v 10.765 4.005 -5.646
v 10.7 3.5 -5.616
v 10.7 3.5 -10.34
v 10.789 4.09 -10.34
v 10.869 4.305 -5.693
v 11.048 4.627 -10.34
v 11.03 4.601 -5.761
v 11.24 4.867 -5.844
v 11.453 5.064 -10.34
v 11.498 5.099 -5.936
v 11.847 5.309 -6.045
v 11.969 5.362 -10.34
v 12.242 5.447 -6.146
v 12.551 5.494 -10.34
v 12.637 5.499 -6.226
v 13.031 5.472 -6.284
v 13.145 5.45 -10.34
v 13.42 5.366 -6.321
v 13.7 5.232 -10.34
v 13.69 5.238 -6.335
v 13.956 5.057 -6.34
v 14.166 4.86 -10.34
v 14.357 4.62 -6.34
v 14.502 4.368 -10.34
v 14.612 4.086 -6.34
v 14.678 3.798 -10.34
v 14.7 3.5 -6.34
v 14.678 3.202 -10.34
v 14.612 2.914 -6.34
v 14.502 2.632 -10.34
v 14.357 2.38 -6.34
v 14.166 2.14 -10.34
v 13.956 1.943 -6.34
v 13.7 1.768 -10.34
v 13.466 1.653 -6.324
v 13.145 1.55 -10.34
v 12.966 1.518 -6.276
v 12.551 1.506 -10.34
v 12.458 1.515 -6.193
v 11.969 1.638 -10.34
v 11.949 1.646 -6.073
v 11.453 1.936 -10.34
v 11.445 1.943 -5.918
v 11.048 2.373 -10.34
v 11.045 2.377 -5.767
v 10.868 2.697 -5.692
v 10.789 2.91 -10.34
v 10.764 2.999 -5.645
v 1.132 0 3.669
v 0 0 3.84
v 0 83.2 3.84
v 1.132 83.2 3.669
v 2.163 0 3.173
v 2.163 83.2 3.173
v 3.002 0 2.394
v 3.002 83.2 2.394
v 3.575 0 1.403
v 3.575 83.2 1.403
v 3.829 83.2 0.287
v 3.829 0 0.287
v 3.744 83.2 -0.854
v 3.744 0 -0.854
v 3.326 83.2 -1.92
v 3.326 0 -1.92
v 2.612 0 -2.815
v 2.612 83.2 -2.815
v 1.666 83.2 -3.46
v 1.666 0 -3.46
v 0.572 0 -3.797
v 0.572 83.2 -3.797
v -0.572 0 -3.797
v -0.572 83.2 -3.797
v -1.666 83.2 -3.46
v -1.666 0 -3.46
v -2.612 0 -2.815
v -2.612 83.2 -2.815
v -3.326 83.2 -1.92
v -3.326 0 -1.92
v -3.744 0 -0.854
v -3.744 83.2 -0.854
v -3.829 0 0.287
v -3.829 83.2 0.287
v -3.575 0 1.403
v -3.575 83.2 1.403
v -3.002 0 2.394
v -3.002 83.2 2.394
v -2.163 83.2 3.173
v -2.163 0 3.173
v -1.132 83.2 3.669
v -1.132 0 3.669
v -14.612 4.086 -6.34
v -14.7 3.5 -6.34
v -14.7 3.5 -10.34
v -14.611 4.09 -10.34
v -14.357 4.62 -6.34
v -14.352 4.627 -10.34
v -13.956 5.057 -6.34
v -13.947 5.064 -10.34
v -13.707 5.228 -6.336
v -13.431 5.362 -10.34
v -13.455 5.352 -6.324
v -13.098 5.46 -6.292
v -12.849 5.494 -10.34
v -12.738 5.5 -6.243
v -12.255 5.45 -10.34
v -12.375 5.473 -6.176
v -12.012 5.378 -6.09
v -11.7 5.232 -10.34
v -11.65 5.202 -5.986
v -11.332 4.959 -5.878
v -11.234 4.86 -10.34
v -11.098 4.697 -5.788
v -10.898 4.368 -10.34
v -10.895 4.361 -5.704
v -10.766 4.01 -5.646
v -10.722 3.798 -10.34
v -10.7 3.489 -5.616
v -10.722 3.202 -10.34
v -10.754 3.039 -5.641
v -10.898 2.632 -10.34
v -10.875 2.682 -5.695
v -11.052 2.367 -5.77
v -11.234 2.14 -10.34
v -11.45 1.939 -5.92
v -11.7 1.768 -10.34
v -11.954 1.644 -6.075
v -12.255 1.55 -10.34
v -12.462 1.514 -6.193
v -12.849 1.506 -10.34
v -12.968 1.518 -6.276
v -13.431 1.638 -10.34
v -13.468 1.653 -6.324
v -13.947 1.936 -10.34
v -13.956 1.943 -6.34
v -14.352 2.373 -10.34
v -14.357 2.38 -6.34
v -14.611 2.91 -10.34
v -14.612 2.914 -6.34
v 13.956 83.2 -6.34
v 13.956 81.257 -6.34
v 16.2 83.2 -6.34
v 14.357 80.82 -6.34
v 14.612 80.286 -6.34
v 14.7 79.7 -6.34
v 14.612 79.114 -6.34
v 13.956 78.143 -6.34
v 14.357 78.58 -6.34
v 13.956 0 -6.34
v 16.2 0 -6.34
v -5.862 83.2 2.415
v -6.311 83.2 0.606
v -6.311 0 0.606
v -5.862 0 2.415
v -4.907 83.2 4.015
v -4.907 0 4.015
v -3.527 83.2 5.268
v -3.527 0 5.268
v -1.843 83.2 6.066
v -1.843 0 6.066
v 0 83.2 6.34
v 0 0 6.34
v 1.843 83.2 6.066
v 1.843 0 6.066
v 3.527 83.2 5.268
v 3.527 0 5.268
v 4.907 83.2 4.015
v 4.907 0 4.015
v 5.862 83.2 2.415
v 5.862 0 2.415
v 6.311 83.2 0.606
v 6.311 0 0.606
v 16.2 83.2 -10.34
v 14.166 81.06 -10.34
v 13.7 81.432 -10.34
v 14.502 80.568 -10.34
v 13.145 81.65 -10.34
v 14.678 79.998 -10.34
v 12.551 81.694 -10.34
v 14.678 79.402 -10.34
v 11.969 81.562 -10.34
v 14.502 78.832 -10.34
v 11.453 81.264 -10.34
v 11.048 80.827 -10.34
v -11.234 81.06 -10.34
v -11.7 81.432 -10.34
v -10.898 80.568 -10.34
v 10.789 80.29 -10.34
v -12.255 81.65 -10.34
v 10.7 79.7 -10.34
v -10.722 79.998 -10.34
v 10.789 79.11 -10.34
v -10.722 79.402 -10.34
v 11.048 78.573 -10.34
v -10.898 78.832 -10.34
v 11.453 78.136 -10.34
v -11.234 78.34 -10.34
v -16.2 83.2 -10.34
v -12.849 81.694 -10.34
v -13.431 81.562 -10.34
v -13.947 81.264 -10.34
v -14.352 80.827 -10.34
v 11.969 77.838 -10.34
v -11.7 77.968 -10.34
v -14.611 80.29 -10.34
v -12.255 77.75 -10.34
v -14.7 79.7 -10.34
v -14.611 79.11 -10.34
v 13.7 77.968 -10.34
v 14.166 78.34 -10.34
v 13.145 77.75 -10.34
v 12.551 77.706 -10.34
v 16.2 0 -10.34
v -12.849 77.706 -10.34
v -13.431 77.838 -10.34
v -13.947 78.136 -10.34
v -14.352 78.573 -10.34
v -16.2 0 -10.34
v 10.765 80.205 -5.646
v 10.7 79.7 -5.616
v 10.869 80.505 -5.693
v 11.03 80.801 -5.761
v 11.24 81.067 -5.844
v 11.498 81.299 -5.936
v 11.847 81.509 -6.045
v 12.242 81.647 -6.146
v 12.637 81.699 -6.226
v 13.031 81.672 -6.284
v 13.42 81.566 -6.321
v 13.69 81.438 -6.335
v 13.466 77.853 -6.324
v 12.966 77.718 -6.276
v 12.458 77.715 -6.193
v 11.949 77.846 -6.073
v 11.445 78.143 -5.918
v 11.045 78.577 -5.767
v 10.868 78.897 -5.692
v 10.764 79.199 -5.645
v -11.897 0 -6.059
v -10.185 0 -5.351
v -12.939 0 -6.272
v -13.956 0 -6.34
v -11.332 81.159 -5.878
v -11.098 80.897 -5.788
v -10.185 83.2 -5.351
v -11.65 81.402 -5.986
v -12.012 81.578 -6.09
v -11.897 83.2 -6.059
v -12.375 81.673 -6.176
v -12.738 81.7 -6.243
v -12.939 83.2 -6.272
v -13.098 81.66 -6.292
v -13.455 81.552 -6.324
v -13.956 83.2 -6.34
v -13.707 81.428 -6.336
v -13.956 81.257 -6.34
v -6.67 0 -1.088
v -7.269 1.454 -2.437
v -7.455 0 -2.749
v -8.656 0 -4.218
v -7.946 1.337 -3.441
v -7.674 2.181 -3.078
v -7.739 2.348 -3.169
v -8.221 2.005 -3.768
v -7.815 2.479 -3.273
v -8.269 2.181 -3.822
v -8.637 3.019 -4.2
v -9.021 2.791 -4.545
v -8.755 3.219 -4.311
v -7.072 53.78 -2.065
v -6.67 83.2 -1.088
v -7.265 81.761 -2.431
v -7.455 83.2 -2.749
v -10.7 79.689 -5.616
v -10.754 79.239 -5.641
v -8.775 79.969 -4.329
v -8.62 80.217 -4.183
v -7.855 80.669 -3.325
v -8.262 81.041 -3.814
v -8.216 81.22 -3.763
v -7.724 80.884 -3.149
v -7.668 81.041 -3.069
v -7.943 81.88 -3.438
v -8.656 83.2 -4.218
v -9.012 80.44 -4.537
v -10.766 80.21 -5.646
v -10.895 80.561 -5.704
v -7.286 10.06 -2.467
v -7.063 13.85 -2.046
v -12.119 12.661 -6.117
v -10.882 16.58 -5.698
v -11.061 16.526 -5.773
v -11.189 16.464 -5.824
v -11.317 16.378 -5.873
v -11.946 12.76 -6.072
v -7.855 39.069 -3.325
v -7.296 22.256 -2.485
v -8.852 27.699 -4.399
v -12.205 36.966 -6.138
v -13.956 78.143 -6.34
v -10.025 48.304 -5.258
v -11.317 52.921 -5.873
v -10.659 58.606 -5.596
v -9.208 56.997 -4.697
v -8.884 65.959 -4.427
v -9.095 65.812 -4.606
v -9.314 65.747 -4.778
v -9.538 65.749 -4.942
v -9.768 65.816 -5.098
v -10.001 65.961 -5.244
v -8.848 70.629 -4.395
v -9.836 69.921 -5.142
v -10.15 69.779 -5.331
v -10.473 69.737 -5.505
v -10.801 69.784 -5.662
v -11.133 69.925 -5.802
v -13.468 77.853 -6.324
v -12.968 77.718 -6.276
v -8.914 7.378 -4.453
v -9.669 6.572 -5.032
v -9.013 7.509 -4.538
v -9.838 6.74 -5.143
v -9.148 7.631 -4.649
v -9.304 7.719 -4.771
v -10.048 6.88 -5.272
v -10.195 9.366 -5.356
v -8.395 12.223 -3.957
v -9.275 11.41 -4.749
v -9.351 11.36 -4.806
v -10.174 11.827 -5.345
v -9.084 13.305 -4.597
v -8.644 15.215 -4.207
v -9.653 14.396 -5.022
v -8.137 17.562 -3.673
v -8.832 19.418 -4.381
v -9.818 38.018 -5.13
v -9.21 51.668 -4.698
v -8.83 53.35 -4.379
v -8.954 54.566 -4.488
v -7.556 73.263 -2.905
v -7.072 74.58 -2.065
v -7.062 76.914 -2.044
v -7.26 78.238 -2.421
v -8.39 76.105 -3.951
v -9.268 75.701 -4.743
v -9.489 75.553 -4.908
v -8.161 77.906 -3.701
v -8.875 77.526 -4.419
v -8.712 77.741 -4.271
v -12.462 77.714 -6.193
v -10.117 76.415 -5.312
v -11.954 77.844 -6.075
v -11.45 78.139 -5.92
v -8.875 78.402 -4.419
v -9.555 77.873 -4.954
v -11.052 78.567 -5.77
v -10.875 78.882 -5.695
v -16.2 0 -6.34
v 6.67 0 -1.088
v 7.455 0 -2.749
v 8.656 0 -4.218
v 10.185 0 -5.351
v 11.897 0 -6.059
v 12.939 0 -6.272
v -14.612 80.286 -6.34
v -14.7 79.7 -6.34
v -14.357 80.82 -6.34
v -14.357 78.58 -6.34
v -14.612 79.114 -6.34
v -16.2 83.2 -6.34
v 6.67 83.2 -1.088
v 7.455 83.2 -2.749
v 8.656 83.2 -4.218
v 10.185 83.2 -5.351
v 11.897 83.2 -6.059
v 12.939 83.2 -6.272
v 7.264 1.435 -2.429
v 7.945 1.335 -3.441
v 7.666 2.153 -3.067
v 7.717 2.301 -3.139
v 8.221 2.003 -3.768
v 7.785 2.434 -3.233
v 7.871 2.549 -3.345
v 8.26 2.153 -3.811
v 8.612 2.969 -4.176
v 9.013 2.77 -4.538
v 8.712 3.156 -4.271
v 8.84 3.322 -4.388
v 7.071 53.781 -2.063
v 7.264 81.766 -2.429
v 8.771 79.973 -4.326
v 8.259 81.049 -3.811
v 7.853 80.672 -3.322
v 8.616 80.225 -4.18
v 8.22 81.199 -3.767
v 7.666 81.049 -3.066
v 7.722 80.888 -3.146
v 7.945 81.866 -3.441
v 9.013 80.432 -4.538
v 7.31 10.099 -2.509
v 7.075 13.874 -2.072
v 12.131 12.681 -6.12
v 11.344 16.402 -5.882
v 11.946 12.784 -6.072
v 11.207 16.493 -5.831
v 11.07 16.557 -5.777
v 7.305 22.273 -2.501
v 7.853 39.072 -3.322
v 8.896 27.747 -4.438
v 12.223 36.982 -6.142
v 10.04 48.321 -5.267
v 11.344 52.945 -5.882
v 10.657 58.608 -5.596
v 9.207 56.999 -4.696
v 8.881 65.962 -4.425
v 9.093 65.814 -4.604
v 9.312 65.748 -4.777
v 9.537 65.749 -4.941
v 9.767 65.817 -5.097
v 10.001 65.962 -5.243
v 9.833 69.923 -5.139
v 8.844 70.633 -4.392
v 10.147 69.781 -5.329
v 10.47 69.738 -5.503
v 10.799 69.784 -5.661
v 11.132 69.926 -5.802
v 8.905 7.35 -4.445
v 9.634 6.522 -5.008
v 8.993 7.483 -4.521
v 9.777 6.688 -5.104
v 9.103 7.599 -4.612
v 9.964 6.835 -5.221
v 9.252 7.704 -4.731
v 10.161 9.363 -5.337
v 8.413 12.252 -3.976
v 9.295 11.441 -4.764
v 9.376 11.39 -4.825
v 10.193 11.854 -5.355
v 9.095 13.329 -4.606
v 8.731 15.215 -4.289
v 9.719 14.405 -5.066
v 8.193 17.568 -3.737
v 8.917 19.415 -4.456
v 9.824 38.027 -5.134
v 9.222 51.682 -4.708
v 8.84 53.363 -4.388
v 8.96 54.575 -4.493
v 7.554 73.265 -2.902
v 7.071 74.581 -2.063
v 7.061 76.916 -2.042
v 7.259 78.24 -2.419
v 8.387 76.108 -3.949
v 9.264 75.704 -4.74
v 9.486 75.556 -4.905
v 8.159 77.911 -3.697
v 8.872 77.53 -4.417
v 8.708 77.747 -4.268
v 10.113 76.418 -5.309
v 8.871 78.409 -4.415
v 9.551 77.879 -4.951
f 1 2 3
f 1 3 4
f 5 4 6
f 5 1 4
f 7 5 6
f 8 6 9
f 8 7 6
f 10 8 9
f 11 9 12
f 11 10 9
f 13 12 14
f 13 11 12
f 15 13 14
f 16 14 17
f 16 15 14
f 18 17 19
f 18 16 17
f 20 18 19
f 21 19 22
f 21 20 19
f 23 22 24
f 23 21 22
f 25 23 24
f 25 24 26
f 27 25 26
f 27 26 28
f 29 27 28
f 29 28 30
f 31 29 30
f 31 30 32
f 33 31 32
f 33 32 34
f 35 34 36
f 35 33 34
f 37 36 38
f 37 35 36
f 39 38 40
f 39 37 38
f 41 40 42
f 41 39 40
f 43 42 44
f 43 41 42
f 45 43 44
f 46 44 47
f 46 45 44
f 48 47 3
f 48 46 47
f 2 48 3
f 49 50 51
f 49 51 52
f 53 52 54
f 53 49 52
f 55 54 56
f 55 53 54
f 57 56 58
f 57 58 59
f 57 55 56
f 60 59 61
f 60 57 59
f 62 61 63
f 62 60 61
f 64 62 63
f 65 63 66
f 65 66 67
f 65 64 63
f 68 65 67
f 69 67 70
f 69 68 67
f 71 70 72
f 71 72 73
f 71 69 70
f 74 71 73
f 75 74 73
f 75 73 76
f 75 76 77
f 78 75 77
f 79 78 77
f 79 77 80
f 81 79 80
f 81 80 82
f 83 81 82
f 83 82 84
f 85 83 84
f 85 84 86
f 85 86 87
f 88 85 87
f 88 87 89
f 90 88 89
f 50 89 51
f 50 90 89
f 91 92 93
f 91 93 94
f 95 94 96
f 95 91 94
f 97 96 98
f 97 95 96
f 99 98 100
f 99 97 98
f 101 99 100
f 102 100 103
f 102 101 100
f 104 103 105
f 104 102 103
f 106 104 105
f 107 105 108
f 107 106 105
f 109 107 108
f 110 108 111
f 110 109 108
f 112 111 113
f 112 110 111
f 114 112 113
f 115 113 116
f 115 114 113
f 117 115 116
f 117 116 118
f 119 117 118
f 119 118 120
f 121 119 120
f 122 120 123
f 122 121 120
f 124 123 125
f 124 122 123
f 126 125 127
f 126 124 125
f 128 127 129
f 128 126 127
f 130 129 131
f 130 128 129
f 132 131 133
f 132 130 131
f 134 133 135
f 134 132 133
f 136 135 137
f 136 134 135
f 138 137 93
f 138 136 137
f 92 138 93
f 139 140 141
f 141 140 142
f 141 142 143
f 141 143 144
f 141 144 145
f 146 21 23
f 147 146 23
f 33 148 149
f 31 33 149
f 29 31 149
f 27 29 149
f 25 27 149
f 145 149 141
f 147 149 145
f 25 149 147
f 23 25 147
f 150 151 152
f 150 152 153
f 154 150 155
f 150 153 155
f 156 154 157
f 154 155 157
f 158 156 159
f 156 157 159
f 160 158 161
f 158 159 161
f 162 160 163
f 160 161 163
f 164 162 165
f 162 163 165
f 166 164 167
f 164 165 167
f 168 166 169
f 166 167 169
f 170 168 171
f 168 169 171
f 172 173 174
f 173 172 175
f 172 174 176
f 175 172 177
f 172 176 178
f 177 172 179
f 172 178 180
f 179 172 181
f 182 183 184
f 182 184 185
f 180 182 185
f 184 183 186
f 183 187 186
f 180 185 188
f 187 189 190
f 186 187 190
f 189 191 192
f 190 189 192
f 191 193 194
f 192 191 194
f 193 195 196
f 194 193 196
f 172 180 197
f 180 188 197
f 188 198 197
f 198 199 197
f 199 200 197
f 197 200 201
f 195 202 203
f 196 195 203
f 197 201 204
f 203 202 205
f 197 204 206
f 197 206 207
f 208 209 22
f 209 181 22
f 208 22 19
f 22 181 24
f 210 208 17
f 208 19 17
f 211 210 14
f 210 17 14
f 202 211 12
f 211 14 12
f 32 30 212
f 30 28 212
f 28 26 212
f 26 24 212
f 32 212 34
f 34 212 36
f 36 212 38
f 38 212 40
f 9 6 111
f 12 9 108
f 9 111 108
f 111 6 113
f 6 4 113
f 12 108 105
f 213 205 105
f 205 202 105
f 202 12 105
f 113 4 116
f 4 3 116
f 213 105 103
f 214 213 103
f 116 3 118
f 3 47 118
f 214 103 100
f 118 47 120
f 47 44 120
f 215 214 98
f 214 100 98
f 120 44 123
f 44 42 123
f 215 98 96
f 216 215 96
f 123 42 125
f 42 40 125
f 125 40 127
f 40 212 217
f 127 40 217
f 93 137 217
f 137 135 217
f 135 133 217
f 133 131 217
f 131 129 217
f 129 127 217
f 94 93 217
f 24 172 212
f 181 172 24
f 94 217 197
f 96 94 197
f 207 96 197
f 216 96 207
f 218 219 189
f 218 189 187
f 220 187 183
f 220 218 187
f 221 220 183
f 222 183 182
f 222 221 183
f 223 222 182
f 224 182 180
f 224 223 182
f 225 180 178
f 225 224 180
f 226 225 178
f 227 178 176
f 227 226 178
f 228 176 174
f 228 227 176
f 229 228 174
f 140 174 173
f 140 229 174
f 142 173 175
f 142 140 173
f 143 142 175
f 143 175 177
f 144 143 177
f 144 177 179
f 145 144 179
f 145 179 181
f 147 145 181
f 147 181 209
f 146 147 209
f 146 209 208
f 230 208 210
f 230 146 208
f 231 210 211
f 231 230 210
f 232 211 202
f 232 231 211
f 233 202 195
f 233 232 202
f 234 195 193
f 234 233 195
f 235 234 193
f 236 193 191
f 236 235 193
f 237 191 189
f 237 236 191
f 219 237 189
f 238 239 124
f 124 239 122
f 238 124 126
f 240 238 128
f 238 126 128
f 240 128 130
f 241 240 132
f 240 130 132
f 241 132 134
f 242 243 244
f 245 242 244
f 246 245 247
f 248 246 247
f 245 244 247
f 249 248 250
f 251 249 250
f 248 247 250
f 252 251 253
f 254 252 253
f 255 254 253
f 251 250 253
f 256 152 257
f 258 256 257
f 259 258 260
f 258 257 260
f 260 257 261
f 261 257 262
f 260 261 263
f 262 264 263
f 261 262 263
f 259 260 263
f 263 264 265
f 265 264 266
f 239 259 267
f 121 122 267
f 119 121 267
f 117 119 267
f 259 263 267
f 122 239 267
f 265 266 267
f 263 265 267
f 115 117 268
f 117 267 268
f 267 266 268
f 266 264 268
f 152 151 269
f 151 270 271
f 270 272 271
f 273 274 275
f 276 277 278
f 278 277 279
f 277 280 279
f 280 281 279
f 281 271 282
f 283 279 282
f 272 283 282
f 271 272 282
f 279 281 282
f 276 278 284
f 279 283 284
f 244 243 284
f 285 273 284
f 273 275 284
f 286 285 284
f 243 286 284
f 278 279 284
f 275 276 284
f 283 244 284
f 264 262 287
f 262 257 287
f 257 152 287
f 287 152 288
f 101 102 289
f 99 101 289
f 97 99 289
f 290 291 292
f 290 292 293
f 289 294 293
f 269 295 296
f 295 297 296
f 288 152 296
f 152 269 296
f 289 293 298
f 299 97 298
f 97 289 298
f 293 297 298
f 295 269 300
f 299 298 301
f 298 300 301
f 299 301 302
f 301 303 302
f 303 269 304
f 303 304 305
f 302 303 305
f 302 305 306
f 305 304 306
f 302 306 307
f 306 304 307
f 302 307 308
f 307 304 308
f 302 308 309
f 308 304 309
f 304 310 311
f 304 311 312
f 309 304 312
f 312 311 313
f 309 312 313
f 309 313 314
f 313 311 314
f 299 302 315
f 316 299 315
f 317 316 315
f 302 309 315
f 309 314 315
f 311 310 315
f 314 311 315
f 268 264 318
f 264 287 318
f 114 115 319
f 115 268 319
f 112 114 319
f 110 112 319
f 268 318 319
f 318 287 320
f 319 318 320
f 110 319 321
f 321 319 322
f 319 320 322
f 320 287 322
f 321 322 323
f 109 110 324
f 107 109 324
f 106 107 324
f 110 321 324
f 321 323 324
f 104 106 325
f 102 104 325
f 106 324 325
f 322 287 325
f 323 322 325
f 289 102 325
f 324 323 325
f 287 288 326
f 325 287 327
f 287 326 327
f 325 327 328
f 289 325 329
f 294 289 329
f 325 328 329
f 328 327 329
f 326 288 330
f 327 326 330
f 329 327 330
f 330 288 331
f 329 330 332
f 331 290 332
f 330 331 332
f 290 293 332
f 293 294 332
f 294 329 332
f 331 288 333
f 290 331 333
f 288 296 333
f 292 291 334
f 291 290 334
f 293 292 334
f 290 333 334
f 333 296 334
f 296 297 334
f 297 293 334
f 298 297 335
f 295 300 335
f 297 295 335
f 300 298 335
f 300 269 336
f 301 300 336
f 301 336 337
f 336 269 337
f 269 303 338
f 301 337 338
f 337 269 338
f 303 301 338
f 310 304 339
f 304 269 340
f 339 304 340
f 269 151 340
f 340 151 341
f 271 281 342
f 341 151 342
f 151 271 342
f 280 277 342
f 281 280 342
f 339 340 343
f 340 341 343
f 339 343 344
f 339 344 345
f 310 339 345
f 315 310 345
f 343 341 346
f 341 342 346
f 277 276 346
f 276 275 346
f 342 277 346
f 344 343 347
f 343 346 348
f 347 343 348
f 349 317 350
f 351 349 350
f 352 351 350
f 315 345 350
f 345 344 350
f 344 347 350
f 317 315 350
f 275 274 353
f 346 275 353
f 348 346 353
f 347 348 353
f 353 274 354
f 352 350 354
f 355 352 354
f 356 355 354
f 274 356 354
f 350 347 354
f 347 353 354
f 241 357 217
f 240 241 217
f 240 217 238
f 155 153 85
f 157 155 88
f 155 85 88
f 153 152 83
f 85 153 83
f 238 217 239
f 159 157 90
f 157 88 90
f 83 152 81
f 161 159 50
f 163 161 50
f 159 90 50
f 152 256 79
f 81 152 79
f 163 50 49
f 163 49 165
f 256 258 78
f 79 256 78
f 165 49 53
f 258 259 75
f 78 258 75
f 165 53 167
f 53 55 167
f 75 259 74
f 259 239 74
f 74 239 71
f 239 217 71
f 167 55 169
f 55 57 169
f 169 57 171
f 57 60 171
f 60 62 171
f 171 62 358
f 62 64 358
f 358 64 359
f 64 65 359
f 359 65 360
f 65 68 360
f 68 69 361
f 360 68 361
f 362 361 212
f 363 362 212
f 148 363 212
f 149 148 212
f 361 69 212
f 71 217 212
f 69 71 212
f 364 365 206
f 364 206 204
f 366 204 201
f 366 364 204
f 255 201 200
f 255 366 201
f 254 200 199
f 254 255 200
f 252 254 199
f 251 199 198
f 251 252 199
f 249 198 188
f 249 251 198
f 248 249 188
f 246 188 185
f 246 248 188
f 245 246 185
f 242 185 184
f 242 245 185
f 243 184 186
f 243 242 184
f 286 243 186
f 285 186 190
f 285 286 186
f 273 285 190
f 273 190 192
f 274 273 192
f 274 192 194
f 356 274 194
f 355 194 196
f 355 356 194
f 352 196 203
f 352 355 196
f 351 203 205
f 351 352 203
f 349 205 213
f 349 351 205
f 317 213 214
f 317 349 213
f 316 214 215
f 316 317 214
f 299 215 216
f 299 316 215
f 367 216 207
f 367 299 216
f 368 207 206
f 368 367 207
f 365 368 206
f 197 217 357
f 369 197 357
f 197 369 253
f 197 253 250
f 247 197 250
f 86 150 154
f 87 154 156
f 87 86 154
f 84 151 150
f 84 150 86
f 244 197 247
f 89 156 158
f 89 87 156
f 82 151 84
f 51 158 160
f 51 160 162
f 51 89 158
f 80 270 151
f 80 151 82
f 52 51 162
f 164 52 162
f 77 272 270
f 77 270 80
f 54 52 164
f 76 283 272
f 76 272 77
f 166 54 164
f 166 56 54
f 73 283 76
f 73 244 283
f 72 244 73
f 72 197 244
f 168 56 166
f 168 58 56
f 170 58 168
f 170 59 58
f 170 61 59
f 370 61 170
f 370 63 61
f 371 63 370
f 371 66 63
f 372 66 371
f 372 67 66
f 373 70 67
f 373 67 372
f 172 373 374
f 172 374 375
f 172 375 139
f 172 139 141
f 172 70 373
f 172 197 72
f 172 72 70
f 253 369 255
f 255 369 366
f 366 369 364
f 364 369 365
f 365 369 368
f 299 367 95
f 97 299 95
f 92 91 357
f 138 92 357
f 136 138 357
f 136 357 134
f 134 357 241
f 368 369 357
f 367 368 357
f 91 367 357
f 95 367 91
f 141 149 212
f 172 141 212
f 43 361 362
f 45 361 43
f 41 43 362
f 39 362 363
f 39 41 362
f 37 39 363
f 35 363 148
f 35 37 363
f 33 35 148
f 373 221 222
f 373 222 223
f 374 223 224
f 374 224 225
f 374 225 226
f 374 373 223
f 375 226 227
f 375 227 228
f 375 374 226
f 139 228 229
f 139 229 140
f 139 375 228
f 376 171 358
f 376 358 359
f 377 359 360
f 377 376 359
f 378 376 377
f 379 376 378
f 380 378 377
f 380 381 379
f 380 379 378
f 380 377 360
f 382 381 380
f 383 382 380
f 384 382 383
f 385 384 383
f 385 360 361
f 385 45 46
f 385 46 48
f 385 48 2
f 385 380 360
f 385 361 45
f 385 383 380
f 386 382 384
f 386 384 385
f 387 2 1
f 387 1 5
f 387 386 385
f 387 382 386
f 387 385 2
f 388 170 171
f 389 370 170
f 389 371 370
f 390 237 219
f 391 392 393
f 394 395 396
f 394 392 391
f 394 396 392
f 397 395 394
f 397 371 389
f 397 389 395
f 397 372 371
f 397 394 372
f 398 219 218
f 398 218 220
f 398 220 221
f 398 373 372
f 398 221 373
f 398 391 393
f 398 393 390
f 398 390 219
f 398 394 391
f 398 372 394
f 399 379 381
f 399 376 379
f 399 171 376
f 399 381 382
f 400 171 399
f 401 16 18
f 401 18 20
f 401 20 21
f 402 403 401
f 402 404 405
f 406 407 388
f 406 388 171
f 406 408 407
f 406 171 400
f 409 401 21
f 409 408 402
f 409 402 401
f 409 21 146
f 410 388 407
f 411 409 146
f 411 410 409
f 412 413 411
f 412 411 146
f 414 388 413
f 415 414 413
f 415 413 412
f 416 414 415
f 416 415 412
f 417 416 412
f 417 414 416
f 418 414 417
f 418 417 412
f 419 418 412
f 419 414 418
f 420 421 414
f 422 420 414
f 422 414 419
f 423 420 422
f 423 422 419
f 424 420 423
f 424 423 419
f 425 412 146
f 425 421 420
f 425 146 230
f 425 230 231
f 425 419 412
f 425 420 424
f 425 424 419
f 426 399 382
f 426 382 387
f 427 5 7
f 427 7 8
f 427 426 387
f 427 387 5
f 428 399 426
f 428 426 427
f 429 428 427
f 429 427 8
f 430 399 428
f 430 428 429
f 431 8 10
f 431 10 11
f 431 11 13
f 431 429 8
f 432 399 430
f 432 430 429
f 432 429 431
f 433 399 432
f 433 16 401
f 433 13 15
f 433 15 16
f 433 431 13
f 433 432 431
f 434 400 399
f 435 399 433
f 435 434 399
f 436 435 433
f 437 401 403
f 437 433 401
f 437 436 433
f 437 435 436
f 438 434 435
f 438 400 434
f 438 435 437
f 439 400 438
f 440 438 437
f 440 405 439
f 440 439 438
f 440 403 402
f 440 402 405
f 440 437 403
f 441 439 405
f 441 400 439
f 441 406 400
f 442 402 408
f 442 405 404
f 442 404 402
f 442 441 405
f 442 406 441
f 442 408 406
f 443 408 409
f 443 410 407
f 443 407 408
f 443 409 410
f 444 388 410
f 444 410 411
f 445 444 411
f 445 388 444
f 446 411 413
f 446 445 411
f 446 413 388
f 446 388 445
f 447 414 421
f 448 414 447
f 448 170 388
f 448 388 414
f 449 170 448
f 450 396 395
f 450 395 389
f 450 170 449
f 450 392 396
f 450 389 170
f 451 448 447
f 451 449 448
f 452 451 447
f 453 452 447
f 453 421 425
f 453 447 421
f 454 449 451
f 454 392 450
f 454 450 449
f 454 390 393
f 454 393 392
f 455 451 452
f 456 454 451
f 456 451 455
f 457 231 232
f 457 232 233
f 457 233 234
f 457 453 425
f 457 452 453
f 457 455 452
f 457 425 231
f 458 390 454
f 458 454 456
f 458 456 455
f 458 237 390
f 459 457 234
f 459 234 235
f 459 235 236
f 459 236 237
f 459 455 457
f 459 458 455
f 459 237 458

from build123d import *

# Parameters (mm, degrees)
SKETCH2_R               = 6.34
SKETCH2_R_2             = 3.84
BOSS_EXTRUDE1_DEPTH     = 83.2
FILLET1_R               = 7.68
CUT_EXTRUDE1_DEPTH      = 89.8622666
CUT_EXTRUDE1_DEPTH_BACK = 89.8622666
SKETCH3_R               = 2


with BuildPart() as part:
    # Sketch2 → Boss-Extrude1 (new body)
    # profile 1 of 2: a face of its own
    with BuildSketch(Plane(origin=(0, 0, 0), x_dir=(1, 0, 0), z_dir=(0, 1, 0))):
        with BuildLine():
            Line((16.2, 10.34), (-16.2, 10.34))
            Line((-16.2, 10.34), (-16.2, 6.34))
            Line((-16.2, 6.34), (-6.34, 6.34))
            Line((-6.34, 6.34), (-6.34, 0))
            ThreePointArc((-6.34, 0), (0, 6.34), (6.34, 0))
            Line((6.34, 0), (6.34, 6.34))
            Line((6.34, 6.34), (16.2, 6.34))
            Line((16.2, 6.34), (16.2, 10.34))
        make_face()
    # profile 2 of 2: a face of its own
    with BuildSketch(Plane(origin=(0, 0, 0), x_dir=(1, 0, 0), z_dir=(0, 1, 0))):
        Circle(SKETCH2_R)
        with Locations(Location((0, 0, 0), (0, 0, 270))):
            Circle(SKETCH2_R_2, mode=Mode.SUBTRACT)
    extrude(amount=BOSS_EXTRUDE1_DEPTH)

    # Fillet1
    fillet1_edges = [part.edges().sort_by_distance(p)[0] for p in [
        (-6.34, 41.6, -6.34),
        (6.34, 41.6, -6.34),
    ]]
    fillet(fillet1_edges, radius=FILLET1_R)

    # Sketch3 → Cut-Extrude1 (cut, two sides: drawn at the far end of the back side and taken through both)
    with BuildSketch(Plane(origin=(0, 0, -20.34), x_dir=(-1, 0, 0), z_dir=(0, 0, -1)).offset(-CUT_EXTRUDE1_DEPTH_BACK)):
        with Locations((12.7, 79.7)):
            Circle(SKETCH3_R)
        with Locations((12.7, 3.5)):
            Circle(SKETCH3_R)
        with Locations((-12.7, 3.5)):
            Circle(SKETCH3_R)
        with Locations((-12.7, 79.7)):
            Circle(SKETCH3_R)
    extrude(amount=CUT_EXTRUDE1_DEPTH + CUT_EXTRUDE1_DEPTH_BACK, mode=Mode.SUBTRACT)


solid = part.part
